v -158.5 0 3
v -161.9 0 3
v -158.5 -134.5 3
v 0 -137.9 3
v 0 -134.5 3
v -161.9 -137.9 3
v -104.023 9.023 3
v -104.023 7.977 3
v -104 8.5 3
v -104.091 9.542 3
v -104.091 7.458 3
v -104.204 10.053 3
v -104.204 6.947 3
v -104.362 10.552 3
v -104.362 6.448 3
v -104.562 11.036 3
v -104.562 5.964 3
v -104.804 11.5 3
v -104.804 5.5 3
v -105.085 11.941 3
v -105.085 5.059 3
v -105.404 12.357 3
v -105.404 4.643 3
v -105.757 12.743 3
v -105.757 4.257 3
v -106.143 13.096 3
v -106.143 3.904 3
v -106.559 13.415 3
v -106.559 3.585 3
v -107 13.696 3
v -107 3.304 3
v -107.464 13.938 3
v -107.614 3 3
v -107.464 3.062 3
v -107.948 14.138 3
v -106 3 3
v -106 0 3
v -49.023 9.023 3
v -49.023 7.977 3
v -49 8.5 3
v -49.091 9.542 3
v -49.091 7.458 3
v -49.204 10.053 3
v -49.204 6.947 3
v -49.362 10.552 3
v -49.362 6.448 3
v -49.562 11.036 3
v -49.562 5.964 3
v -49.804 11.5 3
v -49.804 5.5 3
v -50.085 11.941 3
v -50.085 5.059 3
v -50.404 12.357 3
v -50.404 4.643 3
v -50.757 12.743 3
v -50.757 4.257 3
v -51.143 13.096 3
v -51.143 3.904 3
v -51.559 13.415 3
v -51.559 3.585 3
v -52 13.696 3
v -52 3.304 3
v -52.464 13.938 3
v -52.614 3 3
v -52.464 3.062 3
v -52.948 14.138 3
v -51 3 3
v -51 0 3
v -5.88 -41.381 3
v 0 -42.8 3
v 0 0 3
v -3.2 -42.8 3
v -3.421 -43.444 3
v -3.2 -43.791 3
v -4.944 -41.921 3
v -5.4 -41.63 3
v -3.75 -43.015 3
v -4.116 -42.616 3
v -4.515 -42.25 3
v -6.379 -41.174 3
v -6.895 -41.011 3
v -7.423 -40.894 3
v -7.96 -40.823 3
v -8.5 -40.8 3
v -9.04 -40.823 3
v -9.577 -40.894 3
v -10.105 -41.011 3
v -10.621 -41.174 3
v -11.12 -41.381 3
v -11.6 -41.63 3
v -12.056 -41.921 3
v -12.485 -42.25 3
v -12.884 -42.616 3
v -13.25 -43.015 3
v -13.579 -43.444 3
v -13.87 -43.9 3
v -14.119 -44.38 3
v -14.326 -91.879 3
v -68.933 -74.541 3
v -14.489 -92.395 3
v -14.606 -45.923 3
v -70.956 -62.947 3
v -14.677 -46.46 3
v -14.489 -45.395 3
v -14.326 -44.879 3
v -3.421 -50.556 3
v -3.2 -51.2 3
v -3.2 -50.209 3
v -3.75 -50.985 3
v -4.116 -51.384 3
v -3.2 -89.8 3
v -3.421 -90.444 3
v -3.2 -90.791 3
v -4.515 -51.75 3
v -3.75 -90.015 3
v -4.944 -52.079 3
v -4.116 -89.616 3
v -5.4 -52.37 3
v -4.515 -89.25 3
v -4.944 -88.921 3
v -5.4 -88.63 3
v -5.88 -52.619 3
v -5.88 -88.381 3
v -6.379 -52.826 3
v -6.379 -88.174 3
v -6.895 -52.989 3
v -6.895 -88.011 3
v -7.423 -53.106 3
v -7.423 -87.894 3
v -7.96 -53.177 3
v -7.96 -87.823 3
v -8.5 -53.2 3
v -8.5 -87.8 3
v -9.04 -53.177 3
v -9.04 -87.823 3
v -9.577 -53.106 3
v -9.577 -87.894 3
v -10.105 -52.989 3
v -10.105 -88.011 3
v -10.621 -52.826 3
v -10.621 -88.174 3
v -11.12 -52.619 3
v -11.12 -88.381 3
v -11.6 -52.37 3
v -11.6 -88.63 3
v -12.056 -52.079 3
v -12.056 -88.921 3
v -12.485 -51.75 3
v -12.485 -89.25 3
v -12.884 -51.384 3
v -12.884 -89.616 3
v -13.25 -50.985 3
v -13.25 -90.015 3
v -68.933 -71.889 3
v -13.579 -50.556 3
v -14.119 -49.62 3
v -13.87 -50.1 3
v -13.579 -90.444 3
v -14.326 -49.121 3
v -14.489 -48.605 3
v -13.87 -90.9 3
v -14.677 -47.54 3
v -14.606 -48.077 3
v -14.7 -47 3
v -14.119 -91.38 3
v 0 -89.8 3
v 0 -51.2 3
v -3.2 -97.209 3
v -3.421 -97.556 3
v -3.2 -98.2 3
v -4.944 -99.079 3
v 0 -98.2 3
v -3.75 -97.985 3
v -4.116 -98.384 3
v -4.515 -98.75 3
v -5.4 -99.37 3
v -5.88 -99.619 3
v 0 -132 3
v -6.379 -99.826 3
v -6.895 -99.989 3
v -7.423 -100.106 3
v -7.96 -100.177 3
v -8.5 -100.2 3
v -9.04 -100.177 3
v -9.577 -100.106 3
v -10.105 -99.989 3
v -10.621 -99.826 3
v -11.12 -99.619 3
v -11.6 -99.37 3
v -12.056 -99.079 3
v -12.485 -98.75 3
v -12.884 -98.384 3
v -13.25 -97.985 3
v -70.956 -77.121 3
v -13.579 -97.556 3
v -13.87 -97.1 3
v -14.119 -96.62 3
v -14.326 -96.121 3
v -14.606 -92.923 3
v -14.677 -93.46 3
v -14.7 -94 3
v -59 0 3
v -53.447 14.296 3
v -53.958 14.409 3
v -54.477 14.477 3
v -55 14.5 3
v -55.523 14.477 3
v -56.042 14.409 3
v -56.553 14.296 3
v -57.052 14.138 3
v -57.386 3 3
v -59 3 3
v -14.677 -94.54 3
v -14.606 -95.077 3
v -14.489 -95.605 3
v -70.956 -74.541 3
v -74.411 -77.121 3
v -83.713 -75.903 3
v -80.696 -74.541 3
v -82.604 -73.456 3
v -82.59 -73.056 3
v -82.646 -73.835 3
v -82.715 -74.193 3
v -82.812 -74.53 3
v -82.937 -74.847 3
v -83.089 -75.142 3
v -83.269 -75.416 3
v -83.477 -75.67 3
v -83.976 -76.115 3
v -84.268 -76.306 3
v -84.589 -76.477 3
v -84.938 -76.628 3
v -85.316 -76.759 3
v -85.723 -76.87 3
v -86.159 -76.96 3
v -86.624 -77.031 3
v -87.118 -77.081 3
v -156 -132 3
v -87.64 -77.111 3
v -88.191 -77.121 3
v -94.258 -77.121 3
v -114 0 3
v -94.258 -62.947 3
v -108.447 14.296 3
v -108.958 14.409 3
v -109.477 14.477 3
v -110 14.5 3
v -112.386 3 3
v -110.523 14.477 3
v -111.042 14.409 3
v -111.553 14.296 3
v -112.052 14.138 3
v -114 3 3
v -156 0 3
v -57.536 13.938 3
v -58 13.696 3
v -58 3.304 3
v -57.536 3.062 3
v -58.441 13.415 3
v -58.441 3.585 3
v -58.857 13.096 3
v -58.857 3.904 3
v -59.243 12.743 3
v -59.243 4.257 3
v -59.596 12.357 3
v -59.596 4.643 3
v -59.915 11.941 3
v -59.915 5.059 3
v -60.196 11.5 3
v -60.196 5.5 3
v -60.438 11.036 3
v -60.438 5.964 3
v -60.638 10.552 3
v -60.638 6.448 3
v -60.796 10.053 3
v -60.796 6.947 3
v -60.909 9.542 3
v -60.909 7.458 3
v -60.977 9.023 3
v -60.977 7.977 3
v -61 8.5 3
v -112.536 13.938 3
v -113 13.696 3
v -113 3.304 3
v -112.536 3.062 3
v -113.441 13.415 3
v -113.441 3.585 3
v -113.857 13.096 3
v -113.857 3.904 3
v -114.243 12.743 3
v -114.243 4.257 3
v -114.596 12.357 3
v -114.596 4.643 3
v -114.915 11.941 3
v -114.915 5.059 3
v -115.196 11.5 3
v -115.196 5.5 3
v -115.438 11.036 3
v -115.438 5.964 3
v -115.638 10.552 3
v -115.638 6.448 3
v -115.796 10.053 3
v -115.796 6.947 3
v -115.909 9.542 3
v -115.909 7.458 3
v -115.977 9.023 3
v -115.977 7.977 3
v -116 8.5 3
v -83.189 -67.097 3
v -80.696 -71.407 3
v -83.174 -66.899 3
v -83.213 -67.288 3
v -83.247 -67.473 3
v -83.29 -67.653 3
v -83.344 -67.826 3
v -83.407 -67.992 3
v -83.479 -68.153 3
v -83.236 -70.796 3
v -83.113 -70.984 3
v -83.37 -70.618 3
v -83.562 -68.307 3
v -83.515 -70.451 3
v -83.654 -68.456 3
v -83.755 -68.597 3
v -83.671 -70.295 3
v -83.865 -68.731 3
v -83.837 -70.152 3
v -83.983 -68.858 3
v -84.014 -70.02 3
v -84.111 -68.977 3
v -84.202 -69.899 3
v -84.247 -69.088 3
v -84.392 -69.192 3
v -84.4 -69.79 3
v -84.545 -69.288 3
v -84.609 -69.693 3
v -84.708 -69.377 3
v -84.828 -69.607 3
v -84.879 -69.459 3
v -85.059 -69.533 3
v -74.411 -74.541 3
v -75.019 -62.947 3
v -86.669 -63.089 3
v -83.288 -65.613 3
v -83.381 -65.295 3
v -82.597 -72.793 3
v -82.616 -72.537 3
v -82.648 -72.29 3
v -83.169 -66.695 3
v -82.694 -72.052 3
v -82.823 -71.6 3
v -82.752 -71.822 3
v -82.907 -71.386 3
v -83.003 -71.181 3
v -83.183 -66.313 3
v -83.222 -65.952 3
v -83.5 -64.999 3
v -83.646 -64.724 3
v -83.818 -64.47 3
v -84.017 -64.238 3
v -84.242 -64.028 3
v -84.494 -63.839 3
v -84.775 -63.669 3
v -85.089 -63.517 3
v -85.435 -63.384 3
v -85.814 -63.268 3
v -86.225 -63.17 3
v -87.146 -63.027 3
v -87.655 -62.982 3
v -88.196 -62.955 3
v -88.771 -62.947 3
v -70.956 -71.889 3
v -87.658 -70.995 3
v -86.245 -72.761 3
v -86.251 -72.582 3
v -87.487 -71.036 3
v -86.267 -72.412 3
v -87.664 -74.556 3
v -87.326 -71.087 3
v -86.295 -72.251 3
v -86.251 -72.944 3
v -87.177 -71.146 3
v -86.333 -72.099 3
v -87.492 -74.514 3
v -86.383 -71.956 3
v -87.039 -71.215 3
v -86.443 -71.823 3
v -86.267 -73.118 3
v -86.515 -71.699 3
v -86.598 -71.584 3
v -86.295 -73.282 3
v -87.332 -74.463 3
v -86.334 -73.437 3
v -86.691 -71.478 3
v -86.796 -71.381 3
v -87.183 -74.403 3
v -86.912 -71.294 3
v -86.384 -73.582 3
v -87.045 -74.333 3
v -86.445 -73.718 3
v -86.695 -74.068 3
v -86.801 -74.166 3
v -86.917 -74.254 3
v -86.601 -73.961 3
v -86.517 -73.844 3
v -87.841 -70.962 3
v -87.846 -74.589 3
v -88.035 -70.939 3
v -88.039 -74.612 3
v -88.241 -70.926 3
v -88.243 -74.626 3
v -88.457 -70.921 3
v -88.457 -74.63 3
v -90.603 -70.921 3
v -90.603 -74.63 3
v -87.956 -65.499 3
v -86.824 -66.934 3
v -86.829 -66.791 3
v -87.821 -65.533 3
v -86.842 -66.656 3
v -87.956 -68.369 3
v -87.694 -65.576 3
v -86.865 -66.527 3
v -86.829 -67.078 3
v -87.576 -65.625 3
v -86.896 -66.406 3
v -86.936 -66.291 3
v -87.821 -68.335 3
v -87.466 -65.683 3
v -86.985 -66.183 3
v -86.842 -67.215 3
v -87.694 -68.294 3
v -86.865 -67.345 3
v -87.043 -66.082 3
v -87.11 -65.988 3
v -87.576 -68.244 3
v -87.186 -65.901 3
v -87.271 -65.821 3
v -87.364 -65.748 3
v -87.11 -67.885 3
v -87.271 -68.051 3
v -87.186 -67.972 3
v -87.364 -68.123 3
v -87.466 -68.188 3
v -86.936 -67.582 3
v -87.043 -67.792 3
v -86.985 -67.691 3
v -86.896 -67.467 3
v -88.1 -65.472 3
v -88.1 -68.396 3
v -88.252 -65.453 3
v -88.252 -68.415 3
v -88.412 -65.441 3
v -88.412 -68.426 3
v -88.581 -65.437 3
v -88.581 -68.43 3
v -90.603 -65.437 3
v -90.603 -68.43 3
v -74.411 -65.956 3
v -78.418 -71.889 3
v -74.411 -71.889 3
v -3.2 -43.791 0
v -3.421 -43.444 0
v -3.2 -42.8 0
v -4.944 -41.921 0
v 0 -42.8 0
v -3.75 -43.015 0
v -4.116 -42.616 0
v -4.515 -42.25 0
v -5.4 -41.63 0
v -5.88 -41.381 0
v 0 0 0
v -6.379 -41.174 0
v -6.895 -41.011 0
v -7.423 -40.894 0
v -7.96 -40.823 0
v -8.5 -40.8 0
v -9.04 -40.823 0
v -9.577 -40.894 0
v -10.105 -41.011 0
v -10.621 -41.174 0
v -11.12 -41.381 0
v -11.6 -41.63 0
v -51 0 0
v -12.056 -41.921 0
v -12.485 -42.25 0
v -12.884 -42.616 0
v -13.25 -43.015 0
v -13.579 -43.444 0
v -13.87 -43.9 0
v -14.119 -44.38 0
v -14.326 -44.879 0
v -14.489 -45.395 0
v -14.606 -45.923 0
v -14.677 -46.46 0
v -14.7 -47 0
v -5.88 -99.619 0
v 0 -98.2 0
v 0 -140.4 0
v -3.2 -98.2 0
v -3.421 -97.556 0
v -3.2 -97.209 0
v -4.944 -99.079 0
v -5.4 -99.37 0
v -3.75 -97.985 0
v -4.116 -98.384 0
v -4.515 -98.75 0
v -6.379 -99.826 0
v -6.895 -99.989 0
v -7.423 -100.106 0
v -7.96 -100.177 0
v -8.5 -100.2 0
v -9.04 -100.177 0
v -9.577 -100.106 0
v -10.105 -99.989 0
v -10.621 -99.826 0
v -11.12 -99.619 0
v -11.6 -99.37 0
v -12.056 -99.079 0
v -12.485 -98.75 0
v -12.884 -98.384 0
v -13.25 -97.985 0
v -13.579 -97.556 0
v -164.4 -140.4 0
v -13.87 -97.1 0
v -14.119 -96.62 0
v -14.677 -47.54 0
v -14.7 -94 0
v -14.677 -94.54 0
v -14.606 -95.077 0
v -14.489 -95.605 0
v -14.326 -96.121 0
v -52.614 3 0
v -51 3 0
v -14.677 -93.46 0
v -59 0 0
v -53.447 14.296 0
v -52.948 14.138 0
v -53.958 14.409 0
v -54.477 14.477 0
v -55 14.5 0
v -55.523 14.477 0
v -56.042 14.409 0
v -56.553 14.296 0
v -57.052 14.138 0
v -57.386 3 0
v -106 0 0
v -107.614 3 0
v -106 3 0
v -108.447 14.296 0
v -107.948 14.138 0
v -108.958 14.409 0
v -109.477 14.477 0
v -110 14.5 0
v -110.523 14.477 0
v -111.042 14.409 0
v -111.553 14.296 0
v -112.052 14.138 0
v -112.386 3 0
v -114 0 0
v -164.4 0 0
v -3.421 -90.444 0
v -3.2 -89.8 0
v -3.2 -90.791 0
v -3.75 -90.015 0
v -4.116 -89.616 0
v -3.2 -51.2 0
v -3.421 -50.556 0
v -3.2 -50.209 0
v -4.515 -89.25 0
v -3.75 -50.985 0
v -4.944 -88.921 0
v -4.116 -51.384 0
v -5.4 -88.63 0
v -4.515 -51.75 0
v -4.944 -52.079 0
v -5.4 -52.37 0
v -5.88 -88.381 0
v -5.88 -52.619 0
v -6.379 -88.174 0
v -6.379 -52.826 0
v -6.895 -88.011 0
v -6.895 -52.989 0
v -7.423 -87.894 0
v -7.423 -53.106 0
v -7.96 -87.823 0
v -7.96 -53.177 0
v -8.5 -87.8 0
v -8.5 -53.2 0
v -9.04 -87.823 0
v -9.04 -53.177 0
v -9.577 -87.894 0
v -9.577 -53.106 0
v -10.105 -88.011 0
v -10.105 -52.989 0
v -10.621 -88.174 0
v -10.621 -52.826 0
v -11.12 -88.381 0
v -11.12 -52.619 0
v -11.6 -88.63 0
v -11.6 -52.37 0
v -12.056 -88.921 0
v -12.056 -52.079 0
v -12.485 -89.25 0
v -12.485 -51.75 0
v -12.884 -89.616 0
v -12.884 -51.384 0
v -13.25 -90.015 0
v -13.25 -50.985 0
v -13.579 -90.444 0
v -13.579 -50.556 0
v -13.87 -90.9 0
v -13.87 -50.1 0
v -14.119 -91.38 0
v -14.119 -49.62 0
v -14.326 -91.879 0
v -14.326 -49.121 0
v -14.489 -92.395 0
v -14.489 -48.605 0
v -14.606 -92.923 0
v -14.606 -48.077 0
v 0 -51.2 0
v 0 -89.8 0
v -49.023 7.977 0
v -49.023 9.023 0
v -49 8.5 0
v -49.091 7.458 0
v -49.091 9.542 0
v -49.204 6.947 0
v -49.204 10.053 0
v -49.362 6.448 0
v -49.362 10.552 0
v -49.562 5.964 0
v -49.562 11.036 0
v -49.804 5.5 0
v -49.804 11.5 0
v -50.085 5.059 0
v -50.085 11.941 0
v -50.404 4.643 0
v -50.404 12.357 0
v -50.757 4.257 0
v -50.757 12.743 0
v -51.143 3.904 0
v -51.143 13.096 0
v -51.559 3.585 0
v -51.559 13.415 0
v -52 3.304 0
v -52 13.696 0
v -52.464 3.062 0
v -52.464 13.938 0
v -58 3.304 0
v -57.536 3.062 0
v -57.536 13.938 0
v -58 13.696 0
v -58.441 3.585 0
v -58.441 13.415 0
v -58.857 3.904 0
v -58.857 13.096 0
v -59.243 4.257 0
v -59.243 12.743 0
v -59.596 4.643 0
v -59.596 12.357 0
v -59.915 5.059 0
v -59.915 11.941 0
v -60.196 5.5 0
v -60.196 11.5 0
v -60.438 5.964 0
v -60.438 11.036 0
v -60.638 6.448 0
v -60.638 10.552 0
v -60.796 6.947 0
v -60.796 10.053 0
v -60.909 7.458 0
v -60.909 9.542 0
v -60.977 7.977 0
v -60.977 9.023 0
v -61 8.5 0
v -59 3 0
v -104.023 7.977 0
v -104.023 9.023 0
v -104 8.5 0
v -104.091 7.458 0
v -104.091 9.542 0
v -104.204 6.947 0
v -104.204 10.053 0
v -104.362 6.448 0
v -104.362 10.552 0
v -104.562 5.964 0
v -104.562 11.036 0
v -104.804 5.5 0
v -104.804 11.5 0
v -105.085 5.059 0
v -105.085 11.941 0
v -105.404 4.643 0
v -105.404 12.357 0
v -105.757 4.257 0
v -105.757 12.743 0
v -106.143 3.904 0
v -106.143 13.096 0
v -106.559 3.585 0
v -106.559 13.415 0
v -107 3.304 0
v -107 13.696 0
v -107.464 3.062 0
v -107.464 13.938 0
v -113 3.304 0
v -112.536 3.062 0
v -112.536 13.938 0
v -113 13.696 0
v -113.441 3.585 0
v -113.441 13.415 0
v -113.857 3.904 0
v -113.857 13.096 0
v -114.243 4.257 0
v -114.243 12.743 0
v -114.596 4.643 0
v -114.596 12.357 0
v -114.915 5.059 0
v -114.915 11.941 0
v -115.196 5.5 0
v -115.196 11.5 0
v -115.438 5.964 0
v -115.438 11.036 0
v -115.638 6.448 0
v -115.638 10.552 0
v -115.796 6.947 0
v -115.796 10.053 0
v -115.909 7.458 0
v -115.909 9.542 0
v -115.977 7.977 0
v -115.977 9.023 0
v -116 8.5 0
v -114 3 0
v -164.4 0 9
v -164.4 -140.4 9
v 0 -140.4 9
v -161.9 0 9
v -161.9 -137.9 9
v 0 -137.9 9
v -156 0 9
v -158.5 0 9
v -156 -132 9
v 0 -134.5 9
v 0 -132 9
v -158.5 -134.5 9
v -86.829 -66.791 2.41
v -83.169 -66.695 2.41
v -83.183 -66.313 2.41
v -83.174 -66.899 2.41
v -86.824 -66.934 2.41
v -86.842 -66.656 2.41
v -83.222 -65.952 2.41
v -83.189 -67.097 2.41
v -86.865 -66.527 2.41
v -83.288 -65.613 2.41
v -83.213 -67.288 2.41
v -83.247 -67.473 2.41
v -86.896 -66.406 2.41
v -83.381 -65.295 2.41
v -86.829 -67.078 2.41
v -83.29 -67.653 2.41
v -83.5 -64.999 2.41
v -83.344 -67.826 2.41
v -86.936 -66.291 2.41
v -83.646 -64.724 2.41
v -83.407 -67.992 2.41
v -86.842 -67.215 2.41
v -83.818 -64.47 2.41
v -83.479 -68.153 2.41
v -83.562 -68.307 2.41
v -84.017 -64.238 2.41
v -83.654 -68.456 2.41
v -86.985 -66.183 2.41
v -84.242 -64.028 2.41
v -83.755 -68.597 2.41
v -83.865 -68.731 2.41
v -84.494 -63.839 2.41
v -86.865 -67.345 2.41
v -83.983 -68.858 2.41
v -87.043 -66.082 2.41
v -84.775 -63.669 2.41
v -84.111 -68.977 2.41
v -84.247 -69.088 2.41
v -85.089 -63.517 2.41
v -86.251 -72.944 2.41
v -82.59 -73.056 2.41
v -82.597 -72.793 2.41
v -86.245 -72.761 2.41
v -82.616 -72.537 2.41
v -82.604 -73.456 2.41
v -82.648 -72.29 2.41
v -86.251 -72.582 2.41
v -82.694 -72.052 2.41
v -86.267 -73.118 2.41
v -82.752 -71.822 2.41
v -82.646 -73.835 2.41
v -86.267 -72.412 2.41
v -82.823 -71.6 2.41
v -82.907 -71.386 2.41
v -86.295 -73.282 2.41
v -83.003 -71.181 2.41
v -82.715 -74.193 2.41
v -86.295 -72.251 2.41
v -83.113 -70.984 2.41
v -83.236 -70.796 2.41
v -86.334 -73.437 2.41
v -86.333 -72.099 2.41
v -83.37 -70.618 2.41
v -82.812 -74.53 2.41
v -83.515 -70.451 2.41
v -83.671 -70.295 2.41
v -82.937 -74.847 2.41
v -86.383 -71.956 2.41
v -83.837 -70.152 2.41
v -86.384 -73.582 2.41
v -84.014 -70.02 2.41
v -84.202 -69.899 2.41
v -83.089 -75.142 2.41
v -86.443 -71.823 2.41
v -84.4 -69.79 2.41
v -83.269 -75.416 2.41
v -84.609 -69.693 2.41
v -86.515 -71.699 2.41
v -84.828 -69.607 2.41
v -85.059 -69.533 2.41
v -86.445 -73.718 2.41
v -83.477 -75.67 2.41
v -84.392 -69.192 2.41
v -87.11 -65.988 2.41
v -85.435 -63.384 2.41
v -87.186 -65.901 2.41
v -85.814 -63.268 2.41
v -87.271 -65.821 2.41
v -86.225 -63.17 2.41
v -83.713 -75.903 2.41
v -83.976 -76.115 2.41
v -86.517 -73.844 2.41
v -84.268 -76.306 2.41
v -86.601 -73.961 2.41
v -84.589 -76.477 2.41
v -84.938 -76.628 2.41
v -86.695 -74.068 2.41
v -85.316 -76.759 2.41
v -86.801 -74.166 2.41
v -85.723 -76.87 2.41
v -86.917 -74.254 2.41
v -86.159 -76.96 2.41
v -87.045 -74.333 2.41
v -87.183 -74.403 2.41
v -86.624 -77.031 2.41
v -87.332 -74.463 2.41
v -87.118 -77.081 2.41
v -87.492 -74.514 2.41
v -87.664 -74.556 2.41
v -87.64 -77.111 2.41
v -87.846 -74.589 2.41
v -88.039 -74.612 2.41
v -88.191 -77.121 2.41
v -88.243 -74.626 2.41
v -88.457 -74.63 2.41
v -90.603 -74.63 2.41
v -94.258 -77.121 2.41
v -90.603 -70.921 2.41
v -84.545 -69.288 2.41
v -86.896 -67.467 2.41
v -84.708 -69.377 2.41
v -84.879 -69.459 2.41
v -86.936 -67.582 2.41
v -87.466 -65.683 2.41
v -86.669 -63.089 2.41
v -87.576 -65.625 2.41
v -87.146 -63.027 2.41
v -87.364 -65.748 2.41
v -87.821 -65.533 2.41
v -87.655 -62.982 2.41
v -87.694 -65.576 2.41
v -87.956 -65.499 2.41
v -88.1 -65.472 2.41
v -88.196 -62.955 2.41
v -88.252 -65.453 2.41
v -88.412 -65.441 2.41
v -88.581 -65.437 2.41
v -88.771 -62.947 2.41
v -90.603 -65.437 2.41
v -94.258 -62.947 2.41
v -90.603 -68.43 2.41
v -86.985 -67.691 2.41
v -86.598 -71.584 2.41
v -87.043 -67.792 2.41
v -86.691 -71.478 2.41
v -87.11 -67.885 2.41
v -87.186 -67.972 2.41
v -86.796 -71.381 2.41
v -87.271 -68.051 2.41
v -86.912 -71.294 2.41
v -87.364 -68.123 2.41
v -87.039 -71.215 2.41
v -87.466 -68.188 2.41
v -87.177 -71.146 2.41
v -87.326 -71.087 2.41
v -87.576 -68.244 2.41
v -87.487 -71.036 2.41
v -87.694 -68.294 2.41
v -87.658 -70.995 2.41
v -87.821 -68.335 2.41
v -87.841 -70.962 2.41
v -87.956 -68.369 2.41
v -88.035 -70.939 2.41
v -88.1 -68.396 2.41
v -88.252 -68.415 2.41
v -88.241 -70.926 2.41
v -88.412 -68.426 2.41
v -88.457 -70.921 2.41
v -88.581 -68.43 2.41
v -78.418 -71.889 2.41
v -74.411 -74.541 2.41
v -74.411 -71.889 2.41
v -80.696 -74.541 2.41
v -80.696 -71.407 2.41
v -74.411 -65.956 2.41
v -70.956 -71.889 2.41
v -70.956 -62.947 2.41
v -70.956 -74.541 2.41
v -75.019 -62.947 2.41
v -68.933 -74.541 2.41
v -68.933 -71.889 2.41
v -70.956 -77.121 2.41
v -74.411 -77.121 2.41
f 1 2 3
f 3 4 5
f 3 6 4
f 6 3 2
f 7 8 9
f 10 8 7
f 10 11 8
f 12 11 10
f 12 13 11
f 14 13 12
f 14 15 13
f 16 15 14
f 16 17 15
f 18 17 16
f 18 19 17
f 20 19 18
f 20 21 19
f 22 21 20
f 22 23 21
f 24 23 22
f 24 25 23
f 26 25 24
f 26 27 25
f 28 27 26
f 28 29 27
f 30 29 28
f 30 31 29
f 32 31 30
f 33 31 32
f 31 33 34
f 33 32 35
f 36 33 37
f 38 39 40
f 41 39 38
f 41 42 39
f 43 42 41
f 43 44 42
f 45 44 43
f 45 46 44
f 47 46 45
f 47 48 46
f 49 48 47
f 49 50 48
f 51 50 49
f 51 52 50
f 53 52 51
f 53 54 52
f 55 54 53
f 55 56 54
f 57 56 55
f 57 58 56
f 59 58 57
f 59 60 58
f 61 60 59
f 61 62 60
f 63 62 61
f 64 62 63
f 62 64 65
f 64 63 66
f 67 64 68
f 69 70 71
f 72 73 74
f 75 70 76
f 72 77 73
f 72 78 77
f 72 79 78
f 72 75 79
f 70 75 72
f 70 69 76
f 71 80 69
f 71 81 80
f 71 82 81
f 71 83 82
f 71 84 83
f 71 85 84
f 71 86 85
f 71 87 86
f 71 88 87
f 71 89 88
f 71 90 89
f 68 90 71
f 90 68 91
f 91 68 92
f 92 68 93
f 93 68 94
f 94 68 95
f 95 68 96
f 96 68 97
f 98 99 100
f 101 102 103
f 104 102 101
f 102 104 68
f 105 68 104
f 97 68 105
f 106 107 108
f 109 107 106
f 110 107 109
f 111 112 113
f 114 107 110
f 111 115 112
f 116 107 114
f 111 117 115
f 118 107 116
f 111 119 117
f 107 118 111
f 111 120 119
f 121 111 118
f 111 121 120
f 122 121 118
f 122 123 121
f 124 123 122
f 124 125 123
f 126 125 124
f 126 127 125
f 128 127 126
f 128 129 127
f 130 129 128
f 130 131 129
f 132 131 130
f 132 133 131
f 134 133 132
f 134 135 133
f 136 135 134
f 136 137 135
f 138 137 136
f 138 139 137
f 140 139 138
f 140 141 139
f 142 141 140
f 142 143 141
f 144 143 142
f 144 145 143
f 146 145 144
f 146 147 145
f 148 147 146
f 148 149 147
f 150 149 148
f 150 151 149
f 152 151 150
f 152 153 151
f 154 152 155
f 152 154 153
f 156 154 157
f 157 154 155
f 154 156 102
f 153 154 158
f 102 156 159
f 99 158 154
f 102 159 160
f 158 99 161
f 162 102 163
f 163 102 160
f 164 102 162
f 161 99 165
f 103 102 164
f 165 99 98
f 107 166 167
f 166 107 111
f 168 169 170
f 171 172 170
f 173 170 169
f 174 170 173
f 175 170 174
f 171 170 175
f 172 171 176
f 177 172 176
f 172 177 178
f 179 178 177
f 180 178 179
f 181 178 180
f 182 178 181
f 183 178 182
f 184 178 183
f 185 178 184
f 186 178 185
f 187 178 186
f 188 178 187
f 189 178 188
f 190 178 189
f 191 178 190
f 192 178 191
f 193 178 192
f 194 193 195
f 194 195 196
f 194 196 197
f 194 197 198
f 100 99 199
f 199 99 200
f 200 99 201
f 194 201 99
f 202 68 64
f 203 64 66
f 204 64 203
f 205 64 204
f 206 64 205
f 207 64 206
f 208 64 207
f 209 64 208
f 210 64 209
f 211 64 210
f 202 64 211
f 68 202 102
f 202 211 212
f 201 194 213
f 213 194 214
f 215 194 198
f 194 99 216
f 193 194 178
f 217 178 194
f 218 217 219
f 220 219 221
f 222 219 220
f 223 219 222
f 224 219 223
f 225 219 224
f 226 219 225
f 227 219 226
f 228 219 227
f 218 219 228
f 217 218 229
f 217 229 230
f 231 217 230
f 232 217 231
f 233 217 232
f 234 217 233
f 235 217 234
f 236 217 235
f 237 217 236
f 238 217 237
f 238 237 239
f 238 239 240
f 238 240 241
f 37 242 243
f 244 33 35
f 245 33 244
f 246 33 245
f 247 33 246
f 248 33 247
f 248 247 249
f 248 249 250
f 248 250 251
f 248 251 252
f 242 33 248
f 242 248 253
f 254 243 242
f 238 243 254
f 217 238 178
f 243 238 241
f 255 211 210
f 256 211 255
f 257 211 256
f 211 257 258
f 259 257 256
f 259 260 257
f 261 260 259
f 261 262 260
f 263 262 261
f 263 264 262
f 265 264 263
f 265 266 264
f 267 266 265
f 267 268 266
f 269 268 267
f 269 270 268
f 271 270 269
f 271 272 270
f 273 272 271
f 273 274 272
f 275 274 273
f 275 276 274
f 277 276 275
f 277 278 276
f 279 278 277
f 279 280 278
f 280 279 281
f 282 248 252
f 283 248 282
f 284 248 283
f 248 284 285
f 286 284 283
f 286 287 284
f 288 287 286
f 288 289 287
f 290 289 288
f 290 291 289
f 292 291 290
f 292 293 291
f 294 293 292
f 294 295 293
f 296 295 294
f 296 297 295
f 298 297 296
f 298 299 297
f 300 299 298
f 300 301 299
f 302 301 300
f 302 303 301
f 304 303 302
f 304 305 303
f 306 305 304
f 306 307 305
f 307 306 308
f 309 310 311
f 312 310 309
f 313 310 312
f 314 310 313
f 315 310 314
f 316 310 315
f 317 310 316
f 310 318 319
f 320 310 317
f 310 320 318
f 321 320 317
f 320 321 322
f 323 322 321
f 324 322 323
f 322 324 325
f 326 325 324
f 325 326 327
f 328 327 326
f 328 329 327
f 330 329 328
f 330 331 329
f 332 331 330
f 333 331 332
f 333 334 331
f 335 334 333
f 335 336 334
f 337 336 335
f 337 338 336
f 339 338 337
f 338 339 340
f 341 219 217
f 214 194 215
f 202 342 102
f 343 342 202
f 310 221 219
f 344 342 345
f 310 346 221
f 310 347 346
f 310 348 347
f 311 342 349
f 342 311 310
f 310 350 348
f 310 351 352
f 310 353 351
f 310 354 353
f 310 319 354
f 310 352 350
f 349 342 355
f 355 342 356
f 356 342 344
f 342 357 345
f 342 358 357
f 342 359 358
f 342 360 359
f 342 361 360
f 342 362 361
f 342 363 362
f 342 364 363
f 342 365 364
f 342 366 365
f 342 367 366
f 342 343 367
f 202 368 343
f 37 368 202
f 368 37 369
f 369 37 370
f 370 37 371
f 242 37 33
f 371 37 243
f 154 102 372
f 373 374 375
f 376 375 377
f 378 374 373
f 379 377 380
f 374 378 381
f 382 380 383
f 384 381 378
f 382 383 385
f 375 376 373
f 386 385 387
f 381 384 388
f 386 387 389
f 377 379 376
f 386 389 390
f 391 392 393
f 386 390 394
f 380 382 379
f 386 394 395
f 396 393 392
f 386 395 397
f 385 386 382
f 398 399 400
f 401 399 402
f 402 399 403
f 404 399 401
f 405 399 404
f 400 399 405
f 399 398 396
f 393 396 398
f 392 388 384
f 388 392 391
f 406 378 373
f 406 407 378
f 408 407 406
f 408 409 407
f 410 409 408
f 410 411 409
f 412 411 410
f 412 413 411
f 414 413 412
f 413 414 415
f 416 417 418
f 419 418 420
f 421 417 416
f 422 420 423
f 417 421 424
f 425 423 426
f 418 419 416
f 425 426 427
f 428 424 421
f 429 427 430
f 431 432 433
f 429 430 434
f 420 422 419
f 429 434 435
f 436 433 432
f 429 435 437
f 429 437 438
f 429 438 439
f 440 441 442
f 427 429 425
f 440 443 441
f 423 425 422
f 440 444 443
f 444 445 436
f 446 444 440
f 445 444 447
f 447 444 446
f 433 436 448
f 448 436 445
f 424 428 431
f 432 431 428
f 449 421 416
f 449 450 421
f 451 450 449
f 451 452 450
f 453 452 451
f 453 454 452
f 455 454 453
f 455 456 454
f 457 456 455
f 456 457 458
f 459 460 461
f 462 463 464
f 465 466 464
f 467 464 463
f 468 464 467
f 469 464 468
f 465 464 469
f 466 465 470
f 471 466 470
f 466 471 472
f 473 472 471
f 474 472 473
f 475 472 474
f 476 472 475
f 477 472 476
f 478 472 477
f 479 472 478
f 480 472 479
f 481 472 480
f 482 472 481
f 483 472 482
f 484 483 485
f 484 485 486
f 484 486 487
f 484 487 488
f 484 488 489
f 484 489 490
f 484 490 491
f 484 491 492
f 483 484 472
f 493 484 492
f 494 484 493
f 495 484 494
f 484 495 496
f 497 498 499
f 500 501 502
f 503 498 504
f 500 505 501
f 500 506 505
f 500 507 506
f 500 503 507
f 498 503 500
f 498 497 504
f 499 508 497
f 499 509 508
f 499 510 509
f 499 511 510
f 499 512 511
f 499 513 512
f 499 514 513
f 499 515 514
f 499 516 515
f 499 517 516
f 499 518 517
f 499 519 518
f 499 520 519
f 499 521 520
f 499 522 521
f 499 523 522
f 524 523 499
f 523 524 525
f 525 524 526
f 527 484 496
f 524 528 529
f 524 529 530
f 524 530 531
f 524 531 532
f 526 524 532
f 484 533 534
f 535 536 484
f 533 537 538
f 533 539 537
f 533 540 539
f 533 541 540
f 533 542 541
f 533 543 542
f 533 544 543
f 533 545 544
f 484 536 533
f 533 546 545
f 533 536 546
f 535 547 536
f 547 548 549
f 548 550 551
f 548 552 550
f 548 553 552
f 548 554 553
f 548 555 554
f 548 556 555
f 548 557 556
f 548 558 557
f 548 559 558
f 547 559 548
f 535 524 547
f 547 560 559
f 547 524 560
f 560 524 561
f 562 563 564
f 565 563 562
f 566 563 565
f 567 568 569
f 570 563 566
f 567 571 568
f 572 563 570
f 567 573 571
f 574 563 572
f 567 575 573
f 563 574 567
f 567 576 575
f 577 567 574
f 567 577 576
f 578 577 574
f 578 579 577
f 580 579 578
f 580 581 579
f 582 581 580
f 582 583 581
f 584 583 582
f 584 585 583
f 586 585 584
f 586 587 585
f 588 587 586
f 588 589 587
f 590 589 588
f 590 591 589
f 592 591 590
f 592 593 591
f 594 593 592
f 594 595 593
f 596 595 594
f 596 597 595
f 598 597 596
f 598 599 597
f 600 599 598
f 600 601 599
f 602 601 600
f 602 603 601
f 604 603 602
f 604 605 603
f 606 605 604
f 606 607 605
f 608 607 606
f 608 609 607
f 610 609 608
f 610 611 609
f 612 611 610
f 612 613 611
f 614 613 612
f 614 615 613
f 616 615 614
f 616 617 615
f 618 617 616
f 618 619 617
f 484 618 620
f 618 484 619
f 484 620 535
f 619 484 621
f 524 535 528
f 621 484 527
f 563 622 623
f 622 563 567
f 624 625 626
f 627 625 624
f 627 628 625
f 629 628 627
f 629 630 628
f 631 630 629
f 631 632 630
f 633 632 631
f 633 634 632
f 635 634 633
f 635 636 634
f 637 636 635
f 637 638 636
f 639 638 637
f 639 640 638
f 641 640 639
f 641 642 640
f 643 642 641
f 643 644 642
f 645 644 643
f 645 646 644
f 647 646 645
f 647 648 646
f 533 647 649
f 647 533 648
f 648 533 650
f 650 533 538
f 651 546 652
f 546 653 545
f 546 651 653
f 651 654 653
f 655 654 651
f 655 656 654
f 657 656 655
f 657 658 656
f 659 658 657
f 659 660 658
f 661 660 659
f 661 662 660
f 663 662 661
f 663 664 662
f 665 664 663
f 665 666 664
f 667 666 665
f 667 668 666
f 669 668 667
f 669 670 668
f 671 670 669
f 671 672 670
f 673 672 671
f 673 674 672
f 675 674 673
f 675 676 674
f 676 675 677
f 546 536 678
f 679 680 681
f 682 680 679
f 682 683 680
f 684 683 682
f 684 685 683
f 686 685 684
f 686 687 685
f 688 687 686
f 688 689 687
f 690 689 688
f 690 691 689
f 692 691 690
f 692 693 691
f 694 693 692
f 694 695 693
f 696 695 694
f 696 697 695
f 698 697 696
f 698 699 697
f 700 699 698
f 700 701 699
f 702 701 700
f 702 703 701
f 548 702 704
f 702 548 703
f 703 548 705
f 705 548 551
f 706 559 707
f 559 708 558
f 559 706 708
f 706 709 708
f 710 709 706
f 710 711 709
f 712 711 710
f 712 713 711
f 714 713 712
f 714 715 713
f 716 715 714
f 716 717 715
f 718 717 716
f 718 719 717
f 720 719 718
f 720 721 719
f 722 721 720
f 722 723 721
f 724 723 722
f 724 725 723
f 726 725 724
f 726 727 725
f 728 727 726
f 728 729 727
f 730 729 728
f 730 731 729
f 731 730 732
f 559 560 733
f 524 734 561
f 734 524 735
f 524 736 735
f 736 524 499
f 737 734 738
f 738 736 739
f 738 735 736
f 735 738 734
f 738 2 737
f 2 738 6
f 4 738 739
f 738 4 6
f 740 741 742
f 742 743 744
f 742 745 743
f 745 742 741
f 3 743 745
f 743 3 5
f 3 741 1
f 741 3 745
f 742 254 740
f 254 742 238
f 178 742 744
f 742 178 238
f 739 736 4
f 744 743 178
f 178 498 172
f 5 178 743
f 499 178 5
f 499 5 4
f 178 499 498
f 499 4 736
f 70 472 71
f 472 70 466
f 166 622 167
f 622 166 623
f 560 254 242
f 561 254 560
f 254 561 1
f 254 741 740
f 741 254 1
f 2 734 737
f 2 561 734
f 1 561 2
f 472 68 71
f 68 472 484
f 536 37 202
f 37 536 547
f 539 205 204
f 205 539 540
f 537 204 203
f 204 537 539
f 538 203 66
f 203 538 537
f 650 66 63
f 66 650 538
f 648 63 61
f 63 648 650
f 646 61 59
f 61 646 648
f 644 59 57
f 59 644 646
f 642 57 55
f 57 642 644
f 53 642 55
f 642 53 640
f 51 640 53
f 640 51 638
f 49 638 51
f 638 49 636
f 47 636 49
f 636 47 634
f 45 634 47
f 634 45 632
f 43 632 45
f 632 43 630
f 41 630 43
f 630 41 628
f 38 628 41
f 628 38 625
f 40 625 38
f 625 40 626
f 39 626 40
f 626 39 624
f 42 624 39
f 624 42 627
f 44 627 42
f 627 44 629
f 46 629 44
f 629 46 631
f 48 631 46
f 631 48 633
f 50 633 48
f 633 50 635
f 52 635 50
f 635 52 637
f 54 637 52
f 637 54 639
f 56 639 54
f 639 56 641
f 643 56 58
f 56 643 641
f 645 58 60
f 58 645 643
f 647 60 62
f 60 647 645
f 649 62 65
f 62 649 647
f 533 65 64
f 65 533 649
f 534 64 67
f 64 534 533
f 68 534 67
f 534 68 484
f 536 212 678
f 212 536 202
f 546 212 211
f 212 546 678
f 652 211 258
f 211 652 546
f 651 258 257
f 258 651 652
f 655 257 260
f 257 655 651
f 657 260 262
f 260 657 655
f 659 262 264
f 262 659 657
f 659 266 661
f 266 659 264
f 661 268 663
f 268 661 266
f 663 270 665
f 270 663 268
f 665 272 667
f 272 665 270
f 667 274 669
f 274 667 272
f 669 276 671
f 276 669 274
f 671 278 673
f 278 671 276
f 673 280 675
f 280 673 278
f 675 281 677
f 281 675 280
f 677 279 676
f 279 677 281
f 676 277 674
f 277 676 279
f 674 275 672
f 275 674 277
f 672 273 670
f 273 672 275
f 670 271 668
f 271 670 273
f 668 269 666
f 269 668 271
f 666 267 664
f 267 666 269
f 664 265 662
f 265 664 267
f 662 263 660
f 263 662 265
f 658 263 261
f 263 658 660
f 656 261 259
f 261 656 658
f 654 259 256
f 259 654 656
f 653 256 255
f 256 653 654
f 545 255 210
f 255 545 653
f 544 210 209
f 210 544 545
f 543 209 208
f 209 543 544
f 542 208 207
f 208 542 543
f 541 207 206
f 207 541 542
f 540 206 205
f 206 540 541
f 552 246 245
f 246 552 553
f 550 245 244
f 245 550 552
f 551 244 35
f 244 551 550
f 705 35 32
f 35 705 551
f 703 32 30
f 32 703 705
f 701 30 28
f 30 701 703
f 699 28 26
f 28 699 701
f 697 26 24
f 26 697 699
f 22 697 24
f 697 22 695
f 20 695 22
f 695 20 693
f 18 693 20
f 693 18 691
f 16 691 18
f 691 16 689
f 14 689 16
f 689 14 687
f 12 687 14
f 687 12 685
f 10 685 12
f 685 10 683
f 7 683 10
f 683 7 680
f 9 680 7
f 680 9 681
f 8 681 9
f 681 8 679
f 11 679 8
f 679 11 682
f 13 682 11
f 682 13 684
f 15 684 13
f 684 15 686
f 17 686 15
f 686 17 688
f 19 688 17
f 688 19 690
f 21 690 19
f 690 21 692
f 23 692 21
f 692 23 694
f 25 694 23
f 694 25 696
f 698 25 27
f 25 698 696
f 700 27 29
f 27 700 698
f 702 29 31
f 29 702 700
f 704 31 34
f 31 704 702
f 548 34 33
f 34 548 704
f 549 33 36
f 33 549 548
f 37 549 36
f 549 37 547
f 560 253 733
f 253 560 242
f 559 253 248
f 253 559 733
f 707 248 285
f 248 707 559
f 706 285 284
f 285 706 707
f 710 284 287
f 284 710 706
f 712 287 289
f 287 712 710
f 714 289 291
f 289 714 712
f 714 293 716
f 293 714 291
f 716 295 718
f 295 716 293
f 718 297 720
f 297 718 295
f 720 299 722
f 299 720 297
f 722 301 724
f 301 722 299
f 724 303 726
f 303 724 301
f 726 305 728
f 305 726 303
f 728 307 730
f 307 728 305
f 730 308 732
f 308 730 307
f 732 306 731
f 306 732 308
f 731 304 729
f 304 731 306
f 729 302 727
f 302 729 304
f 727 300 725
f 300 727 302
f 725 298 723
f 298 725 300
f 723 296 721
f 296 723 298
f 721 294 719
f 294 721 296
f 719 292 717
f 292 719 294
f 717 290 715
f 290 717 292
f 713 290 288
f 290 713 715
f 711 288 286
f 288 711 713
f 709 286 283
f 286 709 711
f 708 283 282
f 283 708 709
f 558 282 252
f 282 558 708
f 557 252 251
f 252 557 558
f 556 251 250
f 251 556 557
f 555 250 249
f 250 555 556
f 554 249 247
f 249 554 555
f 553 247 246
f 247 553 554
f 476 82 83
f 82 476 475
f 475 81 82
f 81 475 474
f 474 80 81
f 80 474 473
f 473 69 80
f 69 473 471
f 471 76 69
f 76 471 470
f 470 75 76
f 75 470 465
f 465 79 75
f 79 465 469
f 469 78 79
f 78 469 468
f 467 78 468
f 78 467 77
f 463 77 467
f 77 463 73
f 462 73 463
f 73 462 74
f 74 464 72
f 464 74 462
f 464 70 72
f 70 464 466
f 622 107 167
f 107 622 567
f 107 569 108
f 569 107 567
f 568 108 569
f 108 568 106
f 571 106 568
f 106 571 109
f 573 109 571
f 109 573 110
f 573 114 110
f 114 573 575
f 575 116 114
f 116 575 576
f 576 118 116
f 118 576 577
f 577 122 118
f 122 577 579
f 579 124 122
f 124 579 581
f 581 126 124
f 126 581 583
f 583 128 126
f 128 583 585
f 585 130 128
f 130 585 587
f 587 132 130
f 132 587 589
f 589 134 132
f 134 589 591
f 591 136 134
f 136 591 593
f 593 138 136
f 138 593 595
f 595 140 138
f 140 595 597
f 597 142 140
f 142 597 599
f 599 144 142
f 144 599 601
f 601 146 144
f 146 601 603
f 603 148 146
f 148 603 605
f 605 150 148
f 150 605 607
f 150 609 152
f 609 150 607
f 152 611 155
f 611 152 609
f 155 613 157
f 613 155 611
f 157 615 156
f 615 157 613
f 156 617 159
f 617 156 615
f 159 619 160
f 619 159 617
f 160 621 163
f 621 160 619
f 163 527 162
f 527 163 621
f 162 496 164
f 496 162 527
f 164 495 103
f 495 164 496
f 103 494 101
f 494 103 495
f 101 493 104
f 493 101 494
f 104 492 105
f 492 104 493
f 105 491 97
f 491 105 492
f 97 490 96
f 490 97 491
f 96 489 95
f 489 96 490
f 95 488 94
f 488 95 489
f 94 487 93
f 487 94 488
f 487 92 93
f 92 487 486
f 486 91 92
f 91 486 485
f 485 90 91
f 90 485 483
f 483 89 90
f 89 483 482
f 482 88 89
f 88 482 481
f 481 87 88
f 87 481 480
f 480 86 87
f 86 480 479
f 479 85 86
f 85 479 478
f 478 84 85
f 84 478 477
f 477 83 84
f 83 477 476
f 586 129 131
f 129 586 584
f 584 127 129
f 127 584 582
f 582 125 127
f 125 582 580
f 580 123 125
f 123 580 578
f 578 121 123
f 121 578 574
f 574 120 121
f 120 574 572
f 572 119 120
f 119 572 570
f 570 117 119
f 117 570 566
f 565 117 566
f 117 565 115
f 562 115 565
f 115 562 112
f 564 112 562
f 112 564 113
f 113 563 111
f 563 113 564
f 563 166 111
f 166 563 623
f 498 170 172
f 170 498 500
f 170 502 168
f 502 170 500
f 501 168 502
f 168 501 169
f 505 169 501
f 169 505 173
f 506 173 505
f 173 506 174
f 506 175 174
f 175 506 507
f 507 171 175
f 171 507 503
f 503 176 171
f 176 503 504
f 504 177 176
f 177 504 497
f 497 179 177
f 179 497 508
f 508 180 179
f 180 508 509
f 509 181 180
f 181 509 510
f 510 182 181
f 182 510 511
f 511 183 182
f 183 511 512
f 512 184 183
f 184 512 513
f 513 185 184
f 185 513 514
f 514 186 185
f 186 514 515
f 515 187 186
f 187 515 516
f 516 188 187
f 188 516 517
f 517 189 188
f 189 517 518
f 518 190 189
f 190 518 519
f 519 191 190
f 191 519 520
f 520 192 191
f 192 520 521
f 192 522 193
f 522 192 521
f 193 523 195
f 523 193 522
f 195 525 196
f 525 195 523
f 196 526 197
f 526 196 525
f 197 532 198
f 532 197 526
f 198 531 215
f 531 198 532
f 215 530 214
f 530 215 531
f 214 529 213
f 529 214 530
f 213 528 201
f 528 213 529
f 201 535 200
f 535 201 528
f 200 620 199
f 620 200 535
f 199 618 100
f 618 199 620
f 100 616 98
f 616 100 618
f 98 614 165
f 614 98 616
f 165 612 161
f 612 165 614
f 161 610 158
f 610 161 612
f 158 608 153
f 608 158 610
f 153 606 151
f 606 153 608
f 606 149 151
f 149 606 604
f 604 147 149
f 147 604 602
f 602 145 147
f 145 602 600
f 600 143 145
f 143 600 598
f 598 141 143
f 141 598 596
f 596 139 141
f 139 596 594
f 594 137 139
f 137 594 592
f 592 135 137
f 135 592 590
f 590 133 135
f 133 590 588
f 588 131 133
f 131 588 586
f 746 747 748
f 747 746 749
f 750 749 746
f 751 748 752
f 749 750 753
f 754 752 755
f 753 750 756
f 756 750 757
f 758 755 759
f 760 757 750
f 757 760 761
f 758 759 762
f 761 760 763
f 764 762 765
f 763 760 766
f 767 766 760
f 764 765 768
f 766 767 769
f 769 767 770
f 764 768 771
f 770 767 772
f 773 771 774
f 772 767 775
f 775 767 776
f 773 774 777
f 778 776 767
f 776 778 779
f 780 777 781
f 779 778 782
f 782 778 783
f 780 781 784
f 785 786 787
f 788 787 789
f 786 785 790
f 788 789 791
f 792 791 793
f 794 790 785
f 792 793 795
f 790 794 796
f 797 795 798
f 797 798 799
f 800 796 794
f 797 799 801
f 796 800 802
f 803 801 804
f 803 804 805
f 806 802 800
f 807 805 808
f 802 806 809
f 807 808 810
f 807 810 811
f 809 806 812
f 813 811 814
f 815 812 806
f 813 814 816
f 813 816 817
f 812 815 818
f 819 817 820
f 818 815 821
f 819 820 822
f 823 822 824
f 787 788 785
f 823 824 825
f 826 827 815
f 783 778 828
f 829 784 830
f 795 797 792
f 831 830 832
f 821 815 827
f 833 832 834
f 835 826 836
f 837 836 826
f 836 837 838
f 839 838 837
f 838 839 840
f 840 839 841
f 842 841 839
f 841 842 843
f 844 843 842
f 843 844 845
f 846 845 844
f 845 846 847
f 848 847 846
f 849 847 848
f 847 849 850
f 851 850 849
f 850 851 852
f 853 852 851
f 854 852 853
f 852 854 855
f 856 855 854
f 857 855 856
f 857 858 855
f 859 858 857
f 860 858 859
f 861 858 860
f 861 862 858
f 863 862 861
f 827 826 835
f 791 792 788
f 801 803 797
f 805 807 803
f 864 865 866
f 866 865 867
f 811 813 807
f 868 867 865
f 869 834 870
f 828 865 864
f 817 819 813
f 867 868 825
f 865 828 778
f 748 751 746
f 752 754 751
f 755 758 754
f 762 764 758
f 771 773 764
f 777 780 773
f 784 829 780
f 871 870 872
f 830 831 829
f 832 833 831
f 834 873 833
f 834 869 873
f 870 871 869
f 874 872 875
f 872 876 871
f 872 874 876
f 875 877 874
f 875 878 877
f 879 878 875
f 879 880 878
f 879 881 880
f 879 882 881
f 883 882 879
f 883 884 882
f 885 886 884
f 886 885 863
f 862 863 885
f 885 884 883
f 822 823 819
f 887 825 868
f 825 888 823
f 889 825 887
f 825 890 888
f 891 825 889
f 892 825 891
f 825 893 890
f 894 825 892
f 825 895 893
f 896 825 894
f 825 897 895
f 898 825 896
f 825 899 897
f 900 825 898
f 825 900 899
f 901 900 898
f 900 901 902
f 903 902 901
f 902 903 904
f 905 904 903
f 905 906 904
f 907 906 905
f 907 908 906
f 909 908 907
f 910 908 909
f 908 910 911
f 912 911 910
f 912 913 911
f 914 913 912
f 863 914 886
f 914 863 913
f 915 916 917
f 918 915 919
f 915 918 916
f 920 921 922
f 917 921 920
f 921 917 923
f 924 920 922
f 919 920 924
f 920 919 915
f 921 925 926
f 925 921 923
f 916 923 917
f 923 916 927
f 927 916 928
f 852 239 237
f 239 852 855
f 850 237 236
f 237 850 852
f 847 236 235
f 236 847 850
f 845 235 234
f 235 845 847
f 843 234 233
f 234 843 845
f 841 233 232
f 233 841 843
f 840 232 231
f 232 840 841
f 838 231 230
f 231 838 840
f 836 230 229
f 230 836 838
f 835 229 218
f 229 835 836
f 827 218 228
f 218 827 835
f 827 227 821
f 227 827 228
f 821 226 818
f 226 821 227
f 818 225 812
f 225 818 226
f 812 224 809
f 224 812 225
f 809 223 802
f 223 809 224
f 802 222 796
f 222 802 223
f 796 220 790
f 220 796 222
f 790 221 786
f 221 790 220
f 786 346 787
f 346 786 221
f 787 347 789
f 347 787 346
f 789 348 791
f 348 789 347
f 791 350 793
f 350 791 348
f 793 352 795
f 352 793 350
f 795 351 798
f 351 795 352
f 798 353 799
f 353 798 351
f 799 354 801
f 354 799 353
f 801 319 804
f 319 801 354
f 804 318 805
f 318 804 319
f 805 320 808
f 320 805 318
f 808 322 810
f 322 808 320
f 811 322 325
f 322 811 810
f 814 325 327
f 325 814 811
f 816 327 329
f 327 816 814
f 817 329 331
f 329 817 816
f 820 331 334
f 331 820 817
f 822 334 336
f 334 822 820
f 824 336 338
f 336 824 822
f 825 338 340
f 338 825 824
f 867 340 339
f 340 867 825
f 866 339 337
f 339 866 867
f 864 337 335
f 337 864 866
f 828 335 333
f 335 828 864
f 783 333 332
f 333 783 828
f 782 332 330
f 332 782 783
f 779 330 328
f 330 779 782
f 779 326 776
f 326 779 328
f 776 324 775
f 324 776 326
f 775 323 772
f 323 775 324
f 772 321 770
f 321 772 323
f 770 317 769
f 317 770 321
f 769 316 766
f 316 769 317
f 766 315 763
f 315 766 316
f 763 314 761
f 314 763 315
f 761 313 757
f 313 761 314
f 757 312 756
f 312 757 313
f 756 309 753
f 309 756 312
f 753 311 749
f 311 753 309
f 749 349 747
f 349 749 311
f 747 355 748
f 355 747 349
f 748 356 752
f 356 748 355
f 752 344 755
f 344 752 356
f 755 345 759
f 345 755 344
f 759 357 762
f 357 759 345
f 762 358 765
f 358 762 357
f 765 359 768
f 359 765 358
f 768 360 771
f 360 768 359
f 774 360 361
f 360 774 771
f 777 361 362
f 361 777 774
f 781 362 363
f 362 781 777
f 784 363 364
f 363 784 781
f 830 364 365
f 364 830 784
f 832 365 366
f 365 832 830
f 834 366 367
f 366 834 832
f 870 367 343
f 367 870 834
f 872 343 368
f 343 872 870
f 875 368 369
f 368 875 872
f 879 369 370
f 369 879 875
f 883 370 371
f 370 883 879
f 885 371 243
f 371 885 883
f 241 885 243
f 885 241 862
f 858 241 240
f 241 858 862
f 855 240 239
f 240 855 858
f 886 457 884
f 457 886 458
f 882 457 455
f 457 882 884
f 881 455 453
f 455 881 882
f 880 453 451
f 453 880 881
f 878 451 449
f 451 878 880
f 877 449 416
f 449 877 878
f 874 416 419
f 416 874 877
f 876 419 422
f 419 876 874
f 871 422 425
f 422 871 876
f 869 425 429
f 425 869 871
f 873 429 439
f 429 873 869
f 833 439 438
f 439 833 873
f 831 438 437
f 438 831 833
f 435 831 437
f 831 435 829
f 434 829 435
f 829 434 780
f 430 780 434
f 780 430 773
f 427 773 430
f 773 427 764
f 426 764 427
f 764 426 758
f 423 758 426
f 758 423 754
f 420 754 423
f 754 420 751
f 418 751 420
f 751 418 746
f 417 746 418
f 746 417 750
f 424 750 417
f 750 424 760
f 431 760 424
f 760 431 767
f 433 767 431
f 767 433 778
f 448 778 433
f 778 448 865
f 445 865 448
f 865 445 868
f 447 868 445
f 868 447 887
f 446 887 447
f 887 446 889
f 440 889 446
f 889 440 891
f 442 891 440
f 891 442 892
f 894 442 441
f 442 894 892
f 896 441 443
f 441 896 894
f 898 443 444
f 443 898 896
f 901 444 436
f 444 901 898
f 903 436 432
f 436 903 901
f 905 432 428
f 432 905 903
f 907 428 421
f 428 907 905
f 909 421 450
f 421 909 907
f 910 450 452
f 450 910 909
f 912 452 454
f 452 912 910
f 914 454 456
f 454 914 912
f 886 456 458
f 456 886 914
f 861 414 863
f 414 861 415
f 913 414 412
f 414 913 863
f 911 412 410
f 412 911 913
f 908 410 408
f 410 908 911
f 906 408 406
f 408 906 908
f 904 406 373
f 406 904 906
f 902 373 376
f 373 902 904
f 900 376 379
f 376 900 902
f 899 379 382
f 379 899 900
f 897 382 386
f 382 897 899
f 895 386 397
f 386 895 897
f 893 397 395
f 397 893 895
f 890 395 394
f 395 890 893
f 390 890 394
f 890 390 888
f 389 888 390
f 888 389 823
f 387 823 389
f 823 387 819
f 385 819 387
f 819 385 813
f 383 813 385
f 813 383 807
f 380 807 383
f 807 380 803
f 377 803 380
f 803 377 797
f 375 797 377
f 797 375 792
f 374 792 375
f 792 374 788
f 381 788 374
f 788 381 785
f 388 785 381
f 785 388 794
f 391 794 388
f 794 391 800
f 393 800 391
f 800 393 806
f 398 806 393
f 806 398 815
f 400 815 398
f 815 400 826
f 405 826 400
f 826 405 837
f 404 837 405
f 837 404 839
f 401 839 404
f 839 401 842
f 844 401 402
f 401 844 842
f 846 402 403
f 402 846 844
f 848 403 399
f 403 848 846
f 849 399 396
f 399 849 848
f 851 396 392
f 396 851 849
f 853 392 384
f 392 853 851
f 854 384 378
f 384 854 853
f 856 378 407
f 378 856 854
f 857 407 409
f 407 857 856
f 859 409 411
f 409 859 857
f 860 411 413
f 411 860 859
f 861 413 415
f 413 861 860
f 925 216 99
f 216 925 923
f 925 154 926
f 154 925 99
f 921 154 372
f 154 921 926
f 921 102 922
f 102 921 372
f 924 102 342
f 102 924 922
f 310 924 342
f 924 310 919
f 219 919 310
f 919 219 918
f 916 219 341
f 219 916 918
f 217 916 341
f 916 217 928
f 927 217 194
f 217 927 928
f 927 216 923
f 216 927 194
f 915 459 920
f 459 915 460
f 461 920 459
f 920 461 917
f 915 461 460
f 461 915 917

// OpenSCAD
// P08 — Back quarter B4 (behind Q4). Outer face on the bed, ridges up. PLA, 3 walls.
// Needs lfh_v1_reference.scad in the same folder.
include <lfh_v1_reference.scad>
part = "B4";
pose = "print";
